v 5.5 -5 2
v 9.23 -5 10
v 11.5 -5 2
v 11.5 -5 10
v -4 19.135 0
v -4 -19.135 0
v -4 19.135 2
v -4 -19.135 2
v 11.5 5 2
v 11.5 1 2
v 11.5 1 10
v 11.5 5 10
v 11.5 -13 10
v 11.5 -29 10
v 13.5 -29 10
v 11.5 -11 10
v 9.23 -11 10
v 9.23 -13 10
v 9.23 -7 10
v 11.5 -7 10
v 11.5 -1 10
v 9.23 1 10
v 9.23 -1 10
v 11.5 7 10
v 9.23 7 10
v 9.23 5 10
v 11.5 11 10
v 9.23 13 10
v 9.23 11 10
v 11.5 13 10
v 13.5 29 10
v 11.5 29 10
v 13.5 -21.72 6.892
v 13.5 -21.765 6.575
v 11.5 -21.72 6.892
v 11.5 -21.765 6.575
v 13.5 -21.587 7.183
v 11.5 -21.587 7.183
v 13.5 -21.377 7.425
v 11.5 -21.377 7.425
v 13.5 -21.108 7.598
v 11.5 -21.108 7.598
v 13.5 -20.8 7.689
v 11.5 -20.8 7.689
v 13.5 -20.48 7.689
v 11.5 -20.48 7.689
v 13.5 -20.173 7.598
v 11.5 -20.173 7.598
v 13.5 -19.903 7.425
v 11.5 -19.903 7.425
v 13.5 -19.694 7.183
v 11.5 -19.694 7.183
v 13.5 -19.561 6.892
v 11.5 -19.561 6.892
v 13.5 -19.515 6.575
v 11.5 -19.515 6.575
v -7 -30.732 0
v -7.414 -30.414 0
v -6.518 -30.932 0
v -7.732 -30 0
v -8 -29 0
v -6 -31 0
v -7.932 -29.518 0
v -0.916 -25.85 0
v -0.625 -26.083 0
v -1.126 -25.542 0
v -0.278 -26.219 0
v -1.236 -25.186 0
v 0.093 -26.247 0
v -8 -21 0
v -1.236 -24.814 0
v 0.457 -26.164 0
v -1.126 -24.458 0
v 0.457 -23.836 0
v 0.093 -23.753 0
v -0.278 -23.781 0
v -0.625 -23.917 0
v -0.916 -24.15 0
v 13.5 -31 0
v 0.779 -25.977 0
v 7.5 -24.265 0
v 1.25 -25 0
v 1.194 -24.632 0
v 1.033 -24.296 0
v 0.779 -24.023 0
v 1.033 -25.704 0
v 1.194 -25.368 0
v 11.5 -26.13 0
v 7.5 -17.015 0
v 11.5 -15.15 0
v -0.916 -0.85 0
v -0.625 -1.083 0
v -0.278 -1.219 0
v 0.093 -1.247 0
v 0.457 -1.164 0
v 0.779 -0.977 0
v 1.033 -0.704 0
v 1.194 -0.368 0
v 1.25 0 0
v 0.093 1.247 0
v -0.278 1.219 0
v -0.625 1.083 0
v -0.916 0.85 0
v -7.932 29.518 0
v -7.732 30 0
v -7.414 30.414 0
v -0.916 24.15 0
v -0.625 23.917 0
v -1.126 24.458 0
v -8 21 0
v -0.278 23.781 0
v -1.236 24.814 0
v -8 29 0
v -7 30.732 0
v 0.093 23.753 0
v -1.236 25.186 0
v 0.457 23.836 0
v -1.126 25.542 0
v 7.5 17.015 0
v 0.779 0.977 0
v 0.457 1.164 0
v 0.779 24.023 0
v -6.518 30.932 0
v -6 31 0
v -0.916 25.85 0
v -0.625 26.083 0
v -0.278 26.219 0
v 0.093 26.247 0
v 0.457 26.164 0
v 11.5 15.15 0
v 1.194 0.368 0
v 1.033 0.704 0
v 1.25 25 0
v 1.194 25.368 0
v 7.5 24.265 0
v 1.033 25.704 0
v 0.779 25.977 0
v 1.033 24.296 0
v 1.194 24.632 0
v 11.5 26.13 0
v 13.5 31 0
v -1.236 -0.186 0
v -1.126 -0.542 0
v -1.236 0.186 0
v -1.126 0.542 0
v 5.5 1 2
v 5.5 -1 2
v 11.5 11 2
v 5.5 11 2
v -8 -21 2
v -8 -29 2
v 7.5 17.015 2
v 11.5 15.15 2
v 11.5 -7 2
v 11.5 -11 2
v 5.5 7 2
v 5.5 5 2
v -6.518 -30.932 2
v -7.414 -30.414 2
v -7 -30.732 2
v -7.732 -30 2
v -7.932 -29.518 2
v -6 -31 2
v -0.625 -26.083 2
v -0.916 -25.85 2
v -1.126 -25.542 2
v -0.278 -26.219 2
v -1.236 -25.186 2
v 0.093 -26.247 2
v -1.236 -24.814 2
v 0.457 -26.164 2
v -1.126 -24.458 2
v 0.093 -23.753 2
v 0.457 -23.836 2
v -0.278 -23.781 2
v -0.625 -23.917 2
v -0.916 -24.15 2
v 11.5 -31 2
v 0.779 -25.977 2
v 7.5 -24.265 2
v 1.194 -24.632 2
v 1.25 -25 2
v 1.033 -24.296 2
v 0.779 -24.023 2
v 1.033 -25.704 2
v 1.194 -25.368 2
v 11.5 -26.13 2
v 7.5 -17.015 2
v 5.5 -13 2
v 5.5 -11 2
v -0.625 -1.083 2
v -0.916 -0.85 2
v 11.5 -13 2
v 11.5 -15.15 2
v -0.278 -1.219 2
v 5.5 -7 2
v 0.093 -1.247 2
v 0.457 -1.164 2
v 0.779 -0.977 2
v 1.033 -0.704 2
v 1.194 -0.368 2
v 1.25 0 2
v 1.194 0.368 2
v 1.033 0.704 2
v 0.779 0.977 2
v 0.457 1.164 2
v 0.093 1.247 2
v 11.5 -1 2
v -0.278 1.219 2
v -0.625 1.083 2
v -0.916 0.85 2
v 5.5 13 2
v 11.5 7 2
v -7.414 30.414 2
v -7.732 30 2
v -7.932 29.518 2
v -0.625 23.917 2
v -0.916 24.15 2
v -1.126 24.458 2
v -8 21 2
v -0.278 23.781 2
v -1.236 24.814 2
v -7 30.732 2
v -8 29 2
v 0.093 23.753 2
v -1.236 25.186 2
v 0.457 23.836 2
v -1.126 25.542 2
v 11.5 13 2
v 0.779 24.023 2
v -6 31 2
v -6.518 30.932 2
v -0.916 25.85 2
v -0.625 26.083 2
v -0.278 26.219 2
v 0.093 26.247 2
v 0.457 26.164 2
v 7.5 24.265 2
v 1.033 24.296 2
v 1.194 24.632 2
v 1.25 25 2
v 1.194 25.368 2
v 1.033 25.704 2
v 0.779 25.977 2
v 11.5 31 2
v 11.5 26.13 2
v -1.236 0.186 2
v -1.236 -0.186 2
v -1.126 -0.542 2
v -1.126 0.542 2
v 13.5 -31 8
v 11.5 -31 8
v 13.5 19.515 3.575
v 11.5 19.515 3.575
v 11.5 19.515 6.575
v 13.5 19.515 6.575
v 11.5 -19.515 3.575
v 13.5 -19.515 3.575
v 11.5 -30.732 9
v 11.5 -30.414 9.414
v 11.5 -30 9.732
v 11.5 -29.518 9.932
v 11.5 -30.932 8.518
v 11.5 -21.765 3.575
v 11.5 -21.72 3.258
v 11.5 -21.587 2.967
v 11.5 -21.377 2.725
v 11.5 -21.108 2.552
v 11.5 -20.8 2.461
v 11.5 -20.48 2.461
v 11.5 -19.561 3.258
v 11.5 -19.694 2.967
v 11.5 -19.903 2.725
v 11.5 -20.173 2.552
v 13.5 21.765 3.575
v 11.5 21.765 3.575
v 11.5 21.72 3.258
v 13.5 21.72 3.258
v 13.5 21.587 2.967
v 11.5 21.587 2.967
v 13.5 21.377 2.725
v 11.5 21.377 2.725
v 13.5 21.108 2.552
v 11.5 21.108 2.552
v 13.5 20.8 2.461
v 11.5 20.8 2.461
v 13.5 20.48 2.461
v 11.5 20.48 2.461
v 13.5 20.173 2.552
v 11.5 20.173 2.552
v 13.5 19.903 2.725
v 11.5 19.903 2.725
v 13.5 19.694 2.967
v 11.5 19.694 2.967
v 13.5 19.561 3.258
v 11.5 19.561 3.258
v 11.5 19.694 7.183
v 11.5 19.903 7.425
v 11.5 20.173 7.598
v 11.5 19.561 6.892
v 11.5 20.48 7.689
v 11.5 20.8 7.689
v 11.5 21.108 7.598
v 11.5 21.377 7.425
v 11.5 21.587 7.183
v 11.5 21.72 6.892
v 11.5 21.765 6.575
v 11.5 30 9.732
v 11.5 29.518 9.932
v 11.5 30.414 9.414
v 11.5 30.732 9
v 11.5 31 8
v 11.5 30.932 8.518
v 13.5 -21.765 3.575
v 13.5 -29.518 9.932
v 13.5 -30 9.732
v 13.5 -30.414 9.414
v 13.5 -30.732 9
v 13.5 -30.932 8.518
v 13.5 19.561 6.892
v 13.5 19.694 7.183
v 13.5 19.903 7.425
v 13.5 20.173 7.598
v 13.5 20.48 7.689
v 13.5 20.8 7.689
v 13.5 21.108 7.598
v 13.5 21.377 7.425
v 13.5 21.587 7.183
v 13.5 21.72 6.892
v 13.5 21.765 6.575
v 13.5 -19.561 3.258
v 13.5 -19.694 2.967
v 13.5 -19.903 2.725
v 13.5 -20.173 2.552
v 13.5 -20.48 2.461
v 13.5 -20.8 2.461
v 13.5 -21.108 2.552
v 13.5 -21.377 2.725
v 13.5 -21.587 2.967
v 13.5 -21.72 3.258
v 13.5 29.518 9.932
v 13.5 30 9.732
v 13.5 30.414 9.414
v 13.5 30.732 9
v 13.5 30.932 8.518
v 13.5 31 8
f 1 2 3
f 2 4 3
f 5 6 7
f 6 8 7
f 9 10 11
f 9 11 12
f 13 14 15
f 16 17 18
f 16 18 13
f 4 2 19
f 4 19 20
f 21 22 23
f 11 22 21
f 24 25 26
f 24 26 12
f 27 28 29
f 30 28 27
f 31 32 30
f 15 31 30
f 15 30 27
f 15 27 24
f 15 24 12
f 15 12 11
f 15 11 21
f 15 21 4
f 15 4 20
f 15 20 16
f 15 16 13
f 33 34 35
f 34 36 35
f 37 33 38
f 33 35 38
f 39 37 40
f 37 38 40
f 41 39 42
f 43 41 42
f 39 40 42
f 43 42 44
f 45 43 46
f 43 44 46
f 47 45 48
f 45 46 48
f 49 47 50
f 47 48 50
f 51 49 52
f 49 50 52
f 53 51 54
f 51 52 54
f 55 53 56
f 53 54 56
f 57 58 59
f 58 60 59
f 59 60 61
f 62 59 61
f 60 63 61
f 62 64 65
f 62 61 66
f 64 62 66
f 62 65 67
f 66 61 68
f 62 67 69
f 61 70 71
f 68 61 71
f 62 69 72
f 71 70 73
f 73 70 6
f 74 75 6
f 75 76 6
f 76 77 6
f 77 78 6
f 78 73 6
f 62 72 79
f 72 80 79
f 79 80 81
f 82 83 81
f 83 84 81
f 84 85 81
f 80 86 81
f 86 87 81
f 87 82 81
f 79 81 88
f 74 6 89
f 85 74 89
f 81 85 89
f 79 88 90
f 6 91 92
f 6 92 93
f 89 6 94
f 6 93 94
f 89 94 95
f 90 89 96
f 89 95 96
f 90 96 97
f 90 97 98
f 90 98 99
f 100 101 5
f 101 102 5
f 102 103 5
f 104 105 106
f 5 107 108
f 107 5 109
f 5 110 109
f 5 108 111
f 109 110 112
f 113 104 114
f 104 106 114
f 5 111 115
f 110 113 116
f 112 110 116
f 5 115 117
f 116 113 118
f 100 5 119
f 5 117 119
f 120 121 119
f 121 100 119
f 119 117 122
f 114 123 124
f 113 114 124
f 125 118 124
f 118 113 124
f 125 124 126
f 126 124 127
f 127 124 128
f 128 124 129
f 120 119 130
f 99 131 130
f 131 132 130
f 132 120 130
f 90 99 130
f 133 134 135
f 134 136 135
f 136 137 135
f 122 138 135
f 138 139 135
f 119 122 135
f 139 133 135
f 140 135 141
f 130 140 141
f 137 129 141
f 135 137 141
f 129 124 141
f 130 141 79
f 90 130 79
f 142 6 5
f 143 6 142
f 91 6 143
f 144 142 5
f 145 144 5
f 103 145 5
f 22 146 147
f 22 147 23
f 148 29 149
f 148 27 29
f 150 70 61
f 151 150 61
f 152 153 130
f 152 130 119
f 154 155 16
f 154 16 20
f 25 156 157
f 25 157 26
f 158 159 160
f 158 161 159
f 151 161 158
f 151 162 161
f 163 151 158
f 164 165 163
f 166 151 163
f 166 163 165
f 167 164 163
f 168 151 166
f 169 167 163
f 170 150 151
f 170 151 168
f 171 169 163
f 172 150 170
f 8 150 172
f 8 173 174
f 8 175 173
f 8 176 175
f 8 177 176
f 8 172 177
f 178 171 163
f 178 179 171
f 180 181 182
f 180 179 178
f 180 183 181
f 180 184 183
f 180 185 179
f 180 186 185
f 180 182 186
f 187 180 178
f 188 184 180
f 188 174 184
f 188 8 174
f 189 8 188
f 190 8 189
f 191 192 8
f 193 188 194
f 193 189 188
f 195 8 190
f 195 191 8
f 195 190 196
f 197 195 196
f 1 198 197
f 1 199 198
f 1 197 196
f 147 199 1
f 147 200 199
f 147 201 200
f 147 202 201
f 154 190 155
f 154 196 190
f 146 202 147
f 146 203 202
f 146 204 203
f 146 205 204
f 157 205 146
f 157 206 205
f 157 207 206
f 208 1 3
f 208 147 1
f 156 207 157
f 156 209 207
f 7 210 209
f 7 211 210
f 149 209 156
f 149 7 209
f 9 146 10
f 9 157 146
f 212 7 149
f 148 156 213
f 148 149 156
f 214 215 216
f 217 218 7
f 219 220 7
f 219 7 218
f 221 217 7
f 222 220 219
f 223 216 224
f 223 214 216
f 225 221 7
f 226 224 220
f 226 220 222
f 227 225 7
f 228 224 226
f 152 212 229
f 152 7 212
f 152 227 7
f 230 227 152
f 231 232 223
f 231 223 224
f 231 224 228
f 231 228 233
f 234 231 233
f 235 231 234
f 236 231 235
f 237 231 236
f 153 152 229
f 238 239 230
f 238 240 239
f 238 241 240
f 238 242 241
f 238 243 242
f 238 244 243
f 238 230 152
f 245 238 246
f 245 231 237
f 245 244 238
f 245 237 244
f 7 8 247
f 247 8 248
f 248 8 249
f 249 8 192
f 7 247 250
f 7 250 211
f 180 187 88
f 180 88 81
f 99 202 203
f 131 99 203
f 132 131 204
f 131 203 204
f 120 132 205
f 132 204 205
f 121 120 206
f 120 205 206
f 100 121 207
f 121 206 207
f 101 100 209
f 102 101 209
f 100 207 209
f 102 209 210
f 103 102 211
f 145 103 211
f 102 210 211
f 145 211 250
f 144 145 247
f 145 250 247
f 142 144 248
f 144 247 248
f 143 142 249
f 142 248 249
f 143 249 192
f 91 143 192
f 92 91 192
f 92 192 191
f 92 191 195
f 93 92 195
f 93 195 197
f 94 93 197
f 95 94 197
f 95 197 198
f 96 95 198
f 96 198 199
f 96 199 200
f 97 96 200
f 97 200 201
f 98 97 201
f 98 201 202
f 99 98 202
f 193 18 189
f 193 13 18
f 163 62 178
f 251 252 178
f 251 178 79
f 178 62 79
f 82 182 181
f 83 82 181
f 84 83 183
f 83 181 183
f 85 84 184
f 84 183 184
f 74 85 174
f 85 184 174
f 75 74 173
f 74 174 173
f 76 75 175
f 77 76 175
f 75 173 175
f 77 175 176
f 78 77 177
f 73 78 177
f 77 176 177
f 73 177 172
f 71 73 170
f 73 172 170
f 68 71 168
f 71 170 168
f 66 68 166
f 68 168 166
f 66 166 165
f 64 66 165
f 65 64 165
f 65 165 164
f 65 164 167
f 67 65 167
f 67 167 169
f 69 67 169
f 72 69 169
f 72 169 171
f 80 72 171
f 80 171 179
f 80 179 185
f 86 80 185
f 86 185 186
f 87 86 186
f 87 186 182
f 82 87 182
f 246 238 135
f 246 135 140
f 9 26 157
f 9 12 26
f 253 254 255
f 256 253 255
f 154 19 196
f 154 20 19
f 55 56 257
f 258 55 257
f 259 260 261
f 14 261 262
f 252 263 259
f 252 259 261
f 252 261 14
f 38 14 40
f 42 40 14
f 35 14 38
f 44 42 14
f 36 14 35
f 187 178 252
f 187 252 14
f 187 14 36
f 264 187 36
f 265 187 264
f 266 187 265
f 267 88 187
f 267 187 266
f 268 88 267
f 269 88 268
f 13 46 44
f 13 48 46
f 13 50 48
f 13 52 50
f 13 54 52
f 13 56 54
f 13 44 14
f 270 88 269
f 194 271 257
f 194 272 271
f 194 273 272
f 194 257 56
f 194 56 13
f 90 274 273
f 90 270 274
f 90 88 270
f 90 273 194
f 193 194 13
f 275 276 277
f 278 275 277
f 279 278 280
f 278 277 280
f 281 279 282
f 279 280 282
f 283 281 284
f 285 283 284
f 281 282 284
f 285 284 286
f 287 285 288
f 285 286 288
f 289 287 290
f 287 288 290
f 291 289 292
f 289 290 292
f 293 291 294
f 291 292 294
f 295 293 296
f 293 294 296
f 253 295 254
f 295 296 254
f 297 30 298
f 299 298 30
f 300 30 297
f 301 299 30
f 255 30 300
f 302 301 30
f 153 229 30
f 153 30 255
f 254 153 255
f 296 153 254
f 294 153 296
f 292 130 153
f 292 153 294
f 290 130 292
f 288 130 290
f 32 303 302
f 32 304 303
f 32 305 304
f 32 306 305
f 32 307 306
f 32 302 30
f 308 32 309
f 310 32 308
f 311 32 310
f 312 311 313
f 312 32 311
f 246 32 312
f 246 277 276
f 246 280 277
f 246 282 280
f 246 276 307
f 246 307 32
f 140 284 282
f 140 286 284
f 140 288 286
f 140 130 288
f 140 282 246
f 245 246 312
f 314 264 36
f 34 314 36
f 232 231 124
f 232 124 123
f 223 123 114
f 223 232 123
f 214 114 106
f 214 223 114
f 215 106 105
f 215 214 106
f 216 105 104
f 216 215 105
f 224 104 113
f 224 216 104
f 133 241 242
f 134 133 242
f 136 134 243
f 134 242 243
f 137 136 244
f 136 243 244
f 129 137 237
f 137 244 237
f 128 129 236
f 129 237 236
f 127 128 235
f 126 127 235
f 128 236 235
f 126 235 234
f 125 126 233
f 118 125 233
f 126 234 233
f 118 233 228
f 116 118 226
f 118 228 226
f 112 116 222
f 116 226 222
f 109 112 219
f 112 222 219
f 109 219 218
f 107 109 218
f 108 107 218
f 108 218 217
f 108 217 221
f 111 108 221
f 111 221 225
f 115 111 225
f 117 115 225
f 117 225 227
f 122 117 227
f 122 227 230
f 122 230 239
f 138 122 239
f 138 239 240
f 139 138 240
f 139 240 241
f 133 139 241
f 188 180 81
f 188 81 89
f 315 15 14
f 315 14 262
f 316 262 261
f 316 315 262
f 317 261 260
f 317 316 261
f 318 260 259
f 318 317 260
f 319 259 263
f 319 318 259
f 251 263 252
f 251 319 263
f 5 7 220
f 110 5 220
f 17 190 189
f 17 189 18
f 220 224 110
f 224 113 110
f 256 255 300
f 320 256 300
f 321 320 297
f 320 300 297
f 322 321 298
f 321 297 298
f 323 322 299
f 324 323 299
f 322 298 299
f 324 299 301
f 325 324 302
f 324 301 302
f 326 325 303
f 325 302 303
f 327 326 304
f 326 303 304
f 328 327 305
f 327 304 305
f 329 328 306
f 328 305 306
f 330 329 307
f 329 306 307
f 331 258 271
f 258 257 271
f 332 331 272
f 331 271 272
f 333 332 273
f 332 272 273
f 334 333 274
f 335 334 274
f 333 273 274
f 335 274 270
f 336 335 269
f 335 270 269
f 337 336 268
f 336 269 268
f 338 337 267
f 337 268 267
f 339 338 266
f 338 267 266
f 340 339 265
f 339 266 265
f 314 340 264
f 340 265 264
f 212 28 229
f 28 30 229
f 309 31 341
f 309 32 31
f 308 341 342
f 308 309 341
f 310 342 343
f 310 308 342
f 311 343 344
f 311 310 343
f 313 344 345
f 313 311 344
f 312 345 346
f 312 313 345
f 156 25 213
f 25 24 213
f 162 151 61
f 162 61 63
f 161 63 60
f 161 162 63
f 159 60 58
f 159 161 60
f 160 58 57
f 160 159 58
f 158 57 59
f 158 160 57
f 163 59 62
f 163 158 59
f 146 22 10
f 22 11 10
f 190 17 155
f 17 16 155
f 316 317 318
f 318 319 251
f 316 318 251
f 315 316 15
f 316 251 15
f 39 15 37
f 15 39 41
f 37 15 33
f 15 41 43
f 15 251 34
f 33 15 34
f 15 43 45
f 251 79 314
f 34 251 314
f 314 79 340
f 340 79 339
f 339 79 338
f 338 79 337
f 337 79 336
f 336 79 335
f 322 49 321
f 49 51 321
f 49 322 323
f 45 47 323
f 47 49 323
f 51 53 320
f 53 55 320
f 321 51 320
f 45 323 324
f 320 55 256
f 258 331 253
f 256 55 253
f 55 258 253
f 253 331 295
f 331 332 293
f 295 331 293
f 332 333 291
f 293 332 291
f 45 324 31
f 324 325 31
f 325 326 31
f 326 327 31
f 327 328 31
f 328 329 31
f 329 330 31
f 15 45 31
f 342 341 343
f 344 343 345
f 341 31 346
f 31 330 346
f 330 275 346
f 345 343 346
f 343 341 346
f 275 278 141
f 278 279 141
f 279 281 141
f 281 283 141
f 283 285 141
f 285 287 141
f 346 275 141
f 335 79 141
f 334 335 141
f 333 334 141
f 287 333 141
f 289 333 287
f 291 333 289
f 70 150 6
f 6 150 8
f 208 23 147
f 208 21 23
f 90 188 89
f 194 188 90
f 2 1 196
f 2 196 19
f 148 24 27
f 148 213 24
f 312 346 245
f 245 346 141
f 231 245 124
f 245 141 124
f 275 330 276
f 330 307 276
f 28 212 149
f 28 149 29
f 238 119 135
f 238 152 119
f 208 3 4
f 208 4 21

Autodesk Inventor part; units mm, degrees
ref_plane "YZ Plane" through (0, 0, 0) normal (1, 0, 0) x (0, 1, 0)
ref_plane "XZ Plane" through (0, 0, 0) normal (0, 1, 0) x (-1, 0, 0)
ref_plane "XY Plane" through (0, 0, 0) normal (0, 0, 1) x (1, 0, 0)
sketch "Sketch1" plane through (0, 0, 0) normal (0, 0, 1) x (1, 0, 0)
  circle A0 centre (0, -25) radius 1.25 construction
  circle A1 centre (0, 25) radius 1.25 construction
  circle A2 centre (0, 0) radius 1.25 construction
  line L0 (6, 28.3) -> (11, 33.3) construction
  line L1 (11, 33.3) -> (11, 41.3) construction
  line L2 (9, 43.3) -> (-9, 43.3) construction
  line L3 (-11, 41.3) -> (-11, 33.3) construction
  line L4 (-11, 33.3) -> (-6, 28.3) construction
  line L5 (-6, 28.3) -> (-6, -28.3) construction
  line L6 (-6, -28.3) -> (-11, -33.3) construction
  line L7 (-11, -33.3) -> (-11, -41.3) construction
  line L8 (-9, -43.3) -> (9, -43.3) construction
  line L9 (11, -41.3) -> (11, -33.3) construction
  line L10 (11, -33.3) -> (6, -28.3) construction
  line L11 (6, -28.3) -> (6, 28.3) construction
  circle A3 centre (-6, -38.3) radius 1.375 construction
  circle A4 centre (6, -38.3) radius 1.375 construction
  circle A5 centre (6, 38.3) radius 1.375 construction
  circle A6 centre (-6, 38.3) radius 1.375 construction
  line L12 (13.5, 47.5) -> (13.5, -47.5) construction
  line L13 (-8, -31) -> (13.5, -31)
  line L14 (13.5, -31) -> (13.5, 31)
  line L15 (13.5, 31) -> (-8, 31)
  line L16 (-8, 31) -> (-8, -31)
  arc A7 (11, 41.3) -> (9, 43.3) centre (9, 41.3) ccw projected
  arc A8 (-9, 43.3) -> (-11, 41.3) centre (-9, 41.3) ccw projected
  arc A9 (-11, -41.3) -> (-9, -43.3) centre (-9, -41.3) ccw projected
  arc A10 (9, -43.3) -> (11, -41.3) centre (9, -41.3) ccw projected
  point P0 (0, 0)
  dimension "d0" = 6
  dimension "d1" = 6
  dimension "d2" = 8
extrude "Extrusion1" add sketch "Sketch1" along normal blind 10
shell "Shell1" thickness 2 removed faces 4 at (-0.8333, -31, 3.3333) at (-8, 10.3333, 3.3333) at (-0.8333, 10.3333, 10) at (6.3333, 31, 3.3333)
sketch "Sketch2" plane through (11.5, -31, 2) normal (-1, 0, 0) x (0, 0, 1)
  circle A0 centre (3.075, 10.3598) radius 1.25 construction
  circle A1 centre (3.075, 51.6402) radius 1.25 construction
  line L0 (0, 0) -> (0, 62) projected
  line L1 (8, 0) -> (0, 0) projected
  line L2 (8, 62) -> (8, 0) projected
  line L3 (0, 62) -> (8, 62) projected
  line L4 (1.575, 10.3598) -> (4.575, 10.3598) construction
  line L5 (1.575, 9.2348) -> (4.575, 9.2348)
  line L6 (4.575, 11.4848) -> (1.575, 11.4848)
  arc A2 (1.575, 11.4848) -> (1.575, 9.2348) centre (1.575, 10.3598) ccw
  arc A3 (4.575, 9.2348) -> (4.575, 11.4848) centre (4.575, 10.3598) ccw
  line L7 (1.575, 51.6402) -> (4.575, 51.6402) construction
  line L8 (1.575, 50.5152) -> (4.575, 50.5152)
  line L9 (4.575, 52.7652) -> (1.575, 52.7652)
  arc A4 (1.575, 52.7652) -> (1.575, 50.5152) centre (1.575, 51.6402) ccw
  arc A5 (4.575, 50.5152) -> (4.575, 52.7652) centre (4.575, 51.6402) ccw
  line L10 (3.075, 51.6402) -> (6.075, 51.6402) construction
  point P0 (-2, 31)
  dimension "d6" = 1.5
  dimension "d7" = 2.25
  dimension "d8" = 1.5
  dimension "d9" = 0
  dimension "d10" = 2.25
extrude "Extrusion2" cut sketch "Sketch2" against normal through all contours A2 L6 A3 L5 | A4 L9 A5 L8
sketch "Sketch3" plane through (-8, 31, 2) normal (0, 0, 1) x (1, 0, 0)
  circle A0 centre (8, -56) radius 1.25 projected
  circle A1 centre (8, -6) radius 1.25 projected
  circle A2 centre (8, -31) radius 1.25 projected
  line L0 (14, -2.7) -> (19, 2.3) projected
  line L1 (19, 2.3) -> (19, 10.3) projected
  line L2 (17, 12.3) -> (-1, 12.3) projected
  line L3 (-3, 10.3) -> (-3, 2.3) projected
  line L4 (-3, 2.3) -> (2, -2.7) projected
  line L5 (2, -2.7) -> (2, -59.3) projected
  line L6 (2, -59.3) -> (-3, -64.3) projected
  line L7 (-3, -64.3) -> (-3, -72.3) projected
  line L8 (-1, -74.3) -> (17, -74.3) projected
  line L9 (19, -72.3) -> (19, -64.3) projected
  line L10 (19, -64.3) -> (14, -59.3) projected
  line L11 (14, -59.3) -> (14, -2.7) projected
  circle A3 centre (2, -69.3) radius 1.375 projected
  circle A4 centre (14, -69.3) radius 1.375 projected
  circle A5 centre (14, 7.3) radius 1.375 projected
  circle A6 centre (2, 7.3) radius 1.375 projected
  arc A7 (19, 10.3) -> (17, 12.3) centre (17, 10.3) ccw projected
  arc A8 (-1, 12.3) -> (-3, 10.3) centre (-1, 10.3) ccw projected
  arc A9 (-3, -72.3) -> (-1, -74.3) centre (-1, -72.3) ccw projected
  arc A10 (17, -74.3) -> (19, -72.3) centre (17, -72.3) ccw projected
  point P0 (8, -31)
extrude "Extrusion3" cut sketch "Sketch3" against normal through all contours A0 | A1 | A2
sketch "Sketch4" plane through (-8, 31, 2) normal (0, 0, 1) x (1, 0, 0)
  line L0 (19.5, -52.7652) -> (19.5, -50.5152) projected
  line L1 (19.5, -11.4848) -> (19.5, -9.2348) projected
  line L2 (19.5, -62) -> (19.5, 0) construction
  line L3 (19.5, -57.1304) -> (15.5, -55.2652)
  line L4 (15.5, -55.2652) -> (15.5, -48.0152)
  line L5 (15.5, -48.0152) -> (19.5, -46.1499)
  line L6 (19.5, -52.7652) -> (15.5, -52.7652) construction
  line L7 (19.5, -50.5152) -> (15.5, -50.5152) construction
  line L8 (19.5, -57.1304) -> (19.5, -46.1499)
  point P0 (8, -31)
  dimension "d15" = 65
  dimension "d16" = 65
  dimension "d18" = 2.5
  dimension "d19" = 2.5
  dimension "d20" = 4
extrude "Extrusion4" cut sketch "Sketch4" against normal through all
sketch "Sketch5" plane through (-8, 31, 2) normal (0, 0, 1) x (1, 0, 0)
  line L0 (15.5, -48.0152) -> (19.5, -46.1499) projected
  line L1 (19.5, -46.1499) -> (19.5, 0) projected
  line L2 (0, 0) -> (19.5, 0) projected
  line L3 (0, -62) -> (0, 0) projected
  line L4 (19.5, -62) -> (0, -62) projected
  line L5 (19.5, -62) -> (19.5, -57.1304) projected
  line L6 (19.5, -57.1304) -> (15.5, -55.2652) projected
  line L7 (15.5, -55.2652) -> (15.5, -48.0152) projected
  circle A0 centre (8, -6) radius 1.25 projected
  circle A1 centre (8, -31) radius 1.25 projected
  circle A2 centre (8, -56) radius 1.25 projected
  line L8 (0, -52) -> (4, -50.1348)
  line L9 (4, -50.1348) -> (4, -11.8652)
  line L10 (4, -11.8652) -> (0, -10)
  point P0 (8, -31)
  dimension "d25" = 10
  dimension "d26" = 65
  dimension "d27" = 65
  dimension "d28" = 10
  dimension "d29" = 4
extrude "Extrusion5" cut sketch "Sketch5" against normal through all contours L10 L9 L8 L3
mirror "Mirror1" about plane through (0, 0, 0) normal (0, 1, 0) of "Extrusion4"
sketch "Sketch7" plane through (11.5, -31, 10) normal (-1, 0, 0) x (0, 0, 1)
  line L0 (-6.425, 52.7652) -> (-3.425, 52.7652) projected
  arc A0 (-3.425, 50.5152) -> (-3.425, 52.7652) centre (-3.425, 51.6402) ccw projected
  line L1 (-3.425, 50.5152) -> (-6.425, 50.5152) projected
  arc A1 (-6.425, 52.7652) -> (-6.425, 50.5152) centre (-6.425, 51.6402) ccw projected
  line L2 (-6.425, 11.4848) -> (-3.425, 11.4848) projected
  arc A2 (-3.425, 9.2348) -> (-3.425, 11.4848) centre (-3.425, 10.3598) ccw projected
  line L3 (-3.425, 9.2348) -> (-6.425, 9.2348) projected
  arc A3 (-6.425, 11.4848) -> (-6.425, 9.2348) centre (-6.425, 10.3598) ccw projected
  line L4 (-8, 0) -> (-8, 4.8696) projected
  line L5 (0, 0) -> (-8, 0) projected
  line L6 (0, 62) -> (0, 0) projected
  line L7 (-8, 62) -> (0, 62) projected
  line L8 (-8, 57.1304) -> (-8, 62) projected
  line L9 (-8, 57.1304) -> (-10, 57.1304) projected
  line L10 (-10, 46.1499) -> (-10, 57.1304) projected
  line L11 (-8, 46.1499) -> (-10, 46.1499) projected
  line L12 (-8, 15.8501) -> (-8, 46.1499) projected
  line L13 (-8, 15.8501) -> (-10, 15.8501) projected
  line L14 (-10, 4.8696) -> (-10, 15.8501) projected
  line L15 (-8, 4.8696) -> (-10, 4.8696) projected
  line L16 (0, 0) -> (0, 62) projected
  line L17 (0, 31) -> (-8, 31)
  line L18 (0, 32) -> (-8, 32)
  line L19 (0, 30) -> (-8, 30)
  point P0 (-10, 31)
  dimension "d32" = 1
  dimension "d33" = 1
extrude "Extrusion6" add sketch "Sketch7" along normal blind 6 contours L19 L12 L17 L6 | L17 L12 L18 L6
draft "FaceDraft1" angle 25 pull direction (0, 0, 1) faces at (5.5, 0.3333, 4.6667) fixed edges at (5.5, 0, 2)
pattern_linear "Rectangular Pattern1" count 5 spacing 6 along (0, -1, 0) of "Extrusion6", "FaceDraft1" first direction both ways yes
fillet "Fillet1" radius 2 4 edges at (-8, -31, 1) (-8, 31, 1) (12.5, 31, 10) (12.5, -31, 10)
equation "\"d1\" = d0"
equation "\"d7\" = d10"
equation "\"d16\" = d15"
equation "\"d19\" = d18"
equation "\"d27\" = d26"
equation "\"d28\" = d25"
equation "\"d33\" = d32"
properties part number "A-07"
